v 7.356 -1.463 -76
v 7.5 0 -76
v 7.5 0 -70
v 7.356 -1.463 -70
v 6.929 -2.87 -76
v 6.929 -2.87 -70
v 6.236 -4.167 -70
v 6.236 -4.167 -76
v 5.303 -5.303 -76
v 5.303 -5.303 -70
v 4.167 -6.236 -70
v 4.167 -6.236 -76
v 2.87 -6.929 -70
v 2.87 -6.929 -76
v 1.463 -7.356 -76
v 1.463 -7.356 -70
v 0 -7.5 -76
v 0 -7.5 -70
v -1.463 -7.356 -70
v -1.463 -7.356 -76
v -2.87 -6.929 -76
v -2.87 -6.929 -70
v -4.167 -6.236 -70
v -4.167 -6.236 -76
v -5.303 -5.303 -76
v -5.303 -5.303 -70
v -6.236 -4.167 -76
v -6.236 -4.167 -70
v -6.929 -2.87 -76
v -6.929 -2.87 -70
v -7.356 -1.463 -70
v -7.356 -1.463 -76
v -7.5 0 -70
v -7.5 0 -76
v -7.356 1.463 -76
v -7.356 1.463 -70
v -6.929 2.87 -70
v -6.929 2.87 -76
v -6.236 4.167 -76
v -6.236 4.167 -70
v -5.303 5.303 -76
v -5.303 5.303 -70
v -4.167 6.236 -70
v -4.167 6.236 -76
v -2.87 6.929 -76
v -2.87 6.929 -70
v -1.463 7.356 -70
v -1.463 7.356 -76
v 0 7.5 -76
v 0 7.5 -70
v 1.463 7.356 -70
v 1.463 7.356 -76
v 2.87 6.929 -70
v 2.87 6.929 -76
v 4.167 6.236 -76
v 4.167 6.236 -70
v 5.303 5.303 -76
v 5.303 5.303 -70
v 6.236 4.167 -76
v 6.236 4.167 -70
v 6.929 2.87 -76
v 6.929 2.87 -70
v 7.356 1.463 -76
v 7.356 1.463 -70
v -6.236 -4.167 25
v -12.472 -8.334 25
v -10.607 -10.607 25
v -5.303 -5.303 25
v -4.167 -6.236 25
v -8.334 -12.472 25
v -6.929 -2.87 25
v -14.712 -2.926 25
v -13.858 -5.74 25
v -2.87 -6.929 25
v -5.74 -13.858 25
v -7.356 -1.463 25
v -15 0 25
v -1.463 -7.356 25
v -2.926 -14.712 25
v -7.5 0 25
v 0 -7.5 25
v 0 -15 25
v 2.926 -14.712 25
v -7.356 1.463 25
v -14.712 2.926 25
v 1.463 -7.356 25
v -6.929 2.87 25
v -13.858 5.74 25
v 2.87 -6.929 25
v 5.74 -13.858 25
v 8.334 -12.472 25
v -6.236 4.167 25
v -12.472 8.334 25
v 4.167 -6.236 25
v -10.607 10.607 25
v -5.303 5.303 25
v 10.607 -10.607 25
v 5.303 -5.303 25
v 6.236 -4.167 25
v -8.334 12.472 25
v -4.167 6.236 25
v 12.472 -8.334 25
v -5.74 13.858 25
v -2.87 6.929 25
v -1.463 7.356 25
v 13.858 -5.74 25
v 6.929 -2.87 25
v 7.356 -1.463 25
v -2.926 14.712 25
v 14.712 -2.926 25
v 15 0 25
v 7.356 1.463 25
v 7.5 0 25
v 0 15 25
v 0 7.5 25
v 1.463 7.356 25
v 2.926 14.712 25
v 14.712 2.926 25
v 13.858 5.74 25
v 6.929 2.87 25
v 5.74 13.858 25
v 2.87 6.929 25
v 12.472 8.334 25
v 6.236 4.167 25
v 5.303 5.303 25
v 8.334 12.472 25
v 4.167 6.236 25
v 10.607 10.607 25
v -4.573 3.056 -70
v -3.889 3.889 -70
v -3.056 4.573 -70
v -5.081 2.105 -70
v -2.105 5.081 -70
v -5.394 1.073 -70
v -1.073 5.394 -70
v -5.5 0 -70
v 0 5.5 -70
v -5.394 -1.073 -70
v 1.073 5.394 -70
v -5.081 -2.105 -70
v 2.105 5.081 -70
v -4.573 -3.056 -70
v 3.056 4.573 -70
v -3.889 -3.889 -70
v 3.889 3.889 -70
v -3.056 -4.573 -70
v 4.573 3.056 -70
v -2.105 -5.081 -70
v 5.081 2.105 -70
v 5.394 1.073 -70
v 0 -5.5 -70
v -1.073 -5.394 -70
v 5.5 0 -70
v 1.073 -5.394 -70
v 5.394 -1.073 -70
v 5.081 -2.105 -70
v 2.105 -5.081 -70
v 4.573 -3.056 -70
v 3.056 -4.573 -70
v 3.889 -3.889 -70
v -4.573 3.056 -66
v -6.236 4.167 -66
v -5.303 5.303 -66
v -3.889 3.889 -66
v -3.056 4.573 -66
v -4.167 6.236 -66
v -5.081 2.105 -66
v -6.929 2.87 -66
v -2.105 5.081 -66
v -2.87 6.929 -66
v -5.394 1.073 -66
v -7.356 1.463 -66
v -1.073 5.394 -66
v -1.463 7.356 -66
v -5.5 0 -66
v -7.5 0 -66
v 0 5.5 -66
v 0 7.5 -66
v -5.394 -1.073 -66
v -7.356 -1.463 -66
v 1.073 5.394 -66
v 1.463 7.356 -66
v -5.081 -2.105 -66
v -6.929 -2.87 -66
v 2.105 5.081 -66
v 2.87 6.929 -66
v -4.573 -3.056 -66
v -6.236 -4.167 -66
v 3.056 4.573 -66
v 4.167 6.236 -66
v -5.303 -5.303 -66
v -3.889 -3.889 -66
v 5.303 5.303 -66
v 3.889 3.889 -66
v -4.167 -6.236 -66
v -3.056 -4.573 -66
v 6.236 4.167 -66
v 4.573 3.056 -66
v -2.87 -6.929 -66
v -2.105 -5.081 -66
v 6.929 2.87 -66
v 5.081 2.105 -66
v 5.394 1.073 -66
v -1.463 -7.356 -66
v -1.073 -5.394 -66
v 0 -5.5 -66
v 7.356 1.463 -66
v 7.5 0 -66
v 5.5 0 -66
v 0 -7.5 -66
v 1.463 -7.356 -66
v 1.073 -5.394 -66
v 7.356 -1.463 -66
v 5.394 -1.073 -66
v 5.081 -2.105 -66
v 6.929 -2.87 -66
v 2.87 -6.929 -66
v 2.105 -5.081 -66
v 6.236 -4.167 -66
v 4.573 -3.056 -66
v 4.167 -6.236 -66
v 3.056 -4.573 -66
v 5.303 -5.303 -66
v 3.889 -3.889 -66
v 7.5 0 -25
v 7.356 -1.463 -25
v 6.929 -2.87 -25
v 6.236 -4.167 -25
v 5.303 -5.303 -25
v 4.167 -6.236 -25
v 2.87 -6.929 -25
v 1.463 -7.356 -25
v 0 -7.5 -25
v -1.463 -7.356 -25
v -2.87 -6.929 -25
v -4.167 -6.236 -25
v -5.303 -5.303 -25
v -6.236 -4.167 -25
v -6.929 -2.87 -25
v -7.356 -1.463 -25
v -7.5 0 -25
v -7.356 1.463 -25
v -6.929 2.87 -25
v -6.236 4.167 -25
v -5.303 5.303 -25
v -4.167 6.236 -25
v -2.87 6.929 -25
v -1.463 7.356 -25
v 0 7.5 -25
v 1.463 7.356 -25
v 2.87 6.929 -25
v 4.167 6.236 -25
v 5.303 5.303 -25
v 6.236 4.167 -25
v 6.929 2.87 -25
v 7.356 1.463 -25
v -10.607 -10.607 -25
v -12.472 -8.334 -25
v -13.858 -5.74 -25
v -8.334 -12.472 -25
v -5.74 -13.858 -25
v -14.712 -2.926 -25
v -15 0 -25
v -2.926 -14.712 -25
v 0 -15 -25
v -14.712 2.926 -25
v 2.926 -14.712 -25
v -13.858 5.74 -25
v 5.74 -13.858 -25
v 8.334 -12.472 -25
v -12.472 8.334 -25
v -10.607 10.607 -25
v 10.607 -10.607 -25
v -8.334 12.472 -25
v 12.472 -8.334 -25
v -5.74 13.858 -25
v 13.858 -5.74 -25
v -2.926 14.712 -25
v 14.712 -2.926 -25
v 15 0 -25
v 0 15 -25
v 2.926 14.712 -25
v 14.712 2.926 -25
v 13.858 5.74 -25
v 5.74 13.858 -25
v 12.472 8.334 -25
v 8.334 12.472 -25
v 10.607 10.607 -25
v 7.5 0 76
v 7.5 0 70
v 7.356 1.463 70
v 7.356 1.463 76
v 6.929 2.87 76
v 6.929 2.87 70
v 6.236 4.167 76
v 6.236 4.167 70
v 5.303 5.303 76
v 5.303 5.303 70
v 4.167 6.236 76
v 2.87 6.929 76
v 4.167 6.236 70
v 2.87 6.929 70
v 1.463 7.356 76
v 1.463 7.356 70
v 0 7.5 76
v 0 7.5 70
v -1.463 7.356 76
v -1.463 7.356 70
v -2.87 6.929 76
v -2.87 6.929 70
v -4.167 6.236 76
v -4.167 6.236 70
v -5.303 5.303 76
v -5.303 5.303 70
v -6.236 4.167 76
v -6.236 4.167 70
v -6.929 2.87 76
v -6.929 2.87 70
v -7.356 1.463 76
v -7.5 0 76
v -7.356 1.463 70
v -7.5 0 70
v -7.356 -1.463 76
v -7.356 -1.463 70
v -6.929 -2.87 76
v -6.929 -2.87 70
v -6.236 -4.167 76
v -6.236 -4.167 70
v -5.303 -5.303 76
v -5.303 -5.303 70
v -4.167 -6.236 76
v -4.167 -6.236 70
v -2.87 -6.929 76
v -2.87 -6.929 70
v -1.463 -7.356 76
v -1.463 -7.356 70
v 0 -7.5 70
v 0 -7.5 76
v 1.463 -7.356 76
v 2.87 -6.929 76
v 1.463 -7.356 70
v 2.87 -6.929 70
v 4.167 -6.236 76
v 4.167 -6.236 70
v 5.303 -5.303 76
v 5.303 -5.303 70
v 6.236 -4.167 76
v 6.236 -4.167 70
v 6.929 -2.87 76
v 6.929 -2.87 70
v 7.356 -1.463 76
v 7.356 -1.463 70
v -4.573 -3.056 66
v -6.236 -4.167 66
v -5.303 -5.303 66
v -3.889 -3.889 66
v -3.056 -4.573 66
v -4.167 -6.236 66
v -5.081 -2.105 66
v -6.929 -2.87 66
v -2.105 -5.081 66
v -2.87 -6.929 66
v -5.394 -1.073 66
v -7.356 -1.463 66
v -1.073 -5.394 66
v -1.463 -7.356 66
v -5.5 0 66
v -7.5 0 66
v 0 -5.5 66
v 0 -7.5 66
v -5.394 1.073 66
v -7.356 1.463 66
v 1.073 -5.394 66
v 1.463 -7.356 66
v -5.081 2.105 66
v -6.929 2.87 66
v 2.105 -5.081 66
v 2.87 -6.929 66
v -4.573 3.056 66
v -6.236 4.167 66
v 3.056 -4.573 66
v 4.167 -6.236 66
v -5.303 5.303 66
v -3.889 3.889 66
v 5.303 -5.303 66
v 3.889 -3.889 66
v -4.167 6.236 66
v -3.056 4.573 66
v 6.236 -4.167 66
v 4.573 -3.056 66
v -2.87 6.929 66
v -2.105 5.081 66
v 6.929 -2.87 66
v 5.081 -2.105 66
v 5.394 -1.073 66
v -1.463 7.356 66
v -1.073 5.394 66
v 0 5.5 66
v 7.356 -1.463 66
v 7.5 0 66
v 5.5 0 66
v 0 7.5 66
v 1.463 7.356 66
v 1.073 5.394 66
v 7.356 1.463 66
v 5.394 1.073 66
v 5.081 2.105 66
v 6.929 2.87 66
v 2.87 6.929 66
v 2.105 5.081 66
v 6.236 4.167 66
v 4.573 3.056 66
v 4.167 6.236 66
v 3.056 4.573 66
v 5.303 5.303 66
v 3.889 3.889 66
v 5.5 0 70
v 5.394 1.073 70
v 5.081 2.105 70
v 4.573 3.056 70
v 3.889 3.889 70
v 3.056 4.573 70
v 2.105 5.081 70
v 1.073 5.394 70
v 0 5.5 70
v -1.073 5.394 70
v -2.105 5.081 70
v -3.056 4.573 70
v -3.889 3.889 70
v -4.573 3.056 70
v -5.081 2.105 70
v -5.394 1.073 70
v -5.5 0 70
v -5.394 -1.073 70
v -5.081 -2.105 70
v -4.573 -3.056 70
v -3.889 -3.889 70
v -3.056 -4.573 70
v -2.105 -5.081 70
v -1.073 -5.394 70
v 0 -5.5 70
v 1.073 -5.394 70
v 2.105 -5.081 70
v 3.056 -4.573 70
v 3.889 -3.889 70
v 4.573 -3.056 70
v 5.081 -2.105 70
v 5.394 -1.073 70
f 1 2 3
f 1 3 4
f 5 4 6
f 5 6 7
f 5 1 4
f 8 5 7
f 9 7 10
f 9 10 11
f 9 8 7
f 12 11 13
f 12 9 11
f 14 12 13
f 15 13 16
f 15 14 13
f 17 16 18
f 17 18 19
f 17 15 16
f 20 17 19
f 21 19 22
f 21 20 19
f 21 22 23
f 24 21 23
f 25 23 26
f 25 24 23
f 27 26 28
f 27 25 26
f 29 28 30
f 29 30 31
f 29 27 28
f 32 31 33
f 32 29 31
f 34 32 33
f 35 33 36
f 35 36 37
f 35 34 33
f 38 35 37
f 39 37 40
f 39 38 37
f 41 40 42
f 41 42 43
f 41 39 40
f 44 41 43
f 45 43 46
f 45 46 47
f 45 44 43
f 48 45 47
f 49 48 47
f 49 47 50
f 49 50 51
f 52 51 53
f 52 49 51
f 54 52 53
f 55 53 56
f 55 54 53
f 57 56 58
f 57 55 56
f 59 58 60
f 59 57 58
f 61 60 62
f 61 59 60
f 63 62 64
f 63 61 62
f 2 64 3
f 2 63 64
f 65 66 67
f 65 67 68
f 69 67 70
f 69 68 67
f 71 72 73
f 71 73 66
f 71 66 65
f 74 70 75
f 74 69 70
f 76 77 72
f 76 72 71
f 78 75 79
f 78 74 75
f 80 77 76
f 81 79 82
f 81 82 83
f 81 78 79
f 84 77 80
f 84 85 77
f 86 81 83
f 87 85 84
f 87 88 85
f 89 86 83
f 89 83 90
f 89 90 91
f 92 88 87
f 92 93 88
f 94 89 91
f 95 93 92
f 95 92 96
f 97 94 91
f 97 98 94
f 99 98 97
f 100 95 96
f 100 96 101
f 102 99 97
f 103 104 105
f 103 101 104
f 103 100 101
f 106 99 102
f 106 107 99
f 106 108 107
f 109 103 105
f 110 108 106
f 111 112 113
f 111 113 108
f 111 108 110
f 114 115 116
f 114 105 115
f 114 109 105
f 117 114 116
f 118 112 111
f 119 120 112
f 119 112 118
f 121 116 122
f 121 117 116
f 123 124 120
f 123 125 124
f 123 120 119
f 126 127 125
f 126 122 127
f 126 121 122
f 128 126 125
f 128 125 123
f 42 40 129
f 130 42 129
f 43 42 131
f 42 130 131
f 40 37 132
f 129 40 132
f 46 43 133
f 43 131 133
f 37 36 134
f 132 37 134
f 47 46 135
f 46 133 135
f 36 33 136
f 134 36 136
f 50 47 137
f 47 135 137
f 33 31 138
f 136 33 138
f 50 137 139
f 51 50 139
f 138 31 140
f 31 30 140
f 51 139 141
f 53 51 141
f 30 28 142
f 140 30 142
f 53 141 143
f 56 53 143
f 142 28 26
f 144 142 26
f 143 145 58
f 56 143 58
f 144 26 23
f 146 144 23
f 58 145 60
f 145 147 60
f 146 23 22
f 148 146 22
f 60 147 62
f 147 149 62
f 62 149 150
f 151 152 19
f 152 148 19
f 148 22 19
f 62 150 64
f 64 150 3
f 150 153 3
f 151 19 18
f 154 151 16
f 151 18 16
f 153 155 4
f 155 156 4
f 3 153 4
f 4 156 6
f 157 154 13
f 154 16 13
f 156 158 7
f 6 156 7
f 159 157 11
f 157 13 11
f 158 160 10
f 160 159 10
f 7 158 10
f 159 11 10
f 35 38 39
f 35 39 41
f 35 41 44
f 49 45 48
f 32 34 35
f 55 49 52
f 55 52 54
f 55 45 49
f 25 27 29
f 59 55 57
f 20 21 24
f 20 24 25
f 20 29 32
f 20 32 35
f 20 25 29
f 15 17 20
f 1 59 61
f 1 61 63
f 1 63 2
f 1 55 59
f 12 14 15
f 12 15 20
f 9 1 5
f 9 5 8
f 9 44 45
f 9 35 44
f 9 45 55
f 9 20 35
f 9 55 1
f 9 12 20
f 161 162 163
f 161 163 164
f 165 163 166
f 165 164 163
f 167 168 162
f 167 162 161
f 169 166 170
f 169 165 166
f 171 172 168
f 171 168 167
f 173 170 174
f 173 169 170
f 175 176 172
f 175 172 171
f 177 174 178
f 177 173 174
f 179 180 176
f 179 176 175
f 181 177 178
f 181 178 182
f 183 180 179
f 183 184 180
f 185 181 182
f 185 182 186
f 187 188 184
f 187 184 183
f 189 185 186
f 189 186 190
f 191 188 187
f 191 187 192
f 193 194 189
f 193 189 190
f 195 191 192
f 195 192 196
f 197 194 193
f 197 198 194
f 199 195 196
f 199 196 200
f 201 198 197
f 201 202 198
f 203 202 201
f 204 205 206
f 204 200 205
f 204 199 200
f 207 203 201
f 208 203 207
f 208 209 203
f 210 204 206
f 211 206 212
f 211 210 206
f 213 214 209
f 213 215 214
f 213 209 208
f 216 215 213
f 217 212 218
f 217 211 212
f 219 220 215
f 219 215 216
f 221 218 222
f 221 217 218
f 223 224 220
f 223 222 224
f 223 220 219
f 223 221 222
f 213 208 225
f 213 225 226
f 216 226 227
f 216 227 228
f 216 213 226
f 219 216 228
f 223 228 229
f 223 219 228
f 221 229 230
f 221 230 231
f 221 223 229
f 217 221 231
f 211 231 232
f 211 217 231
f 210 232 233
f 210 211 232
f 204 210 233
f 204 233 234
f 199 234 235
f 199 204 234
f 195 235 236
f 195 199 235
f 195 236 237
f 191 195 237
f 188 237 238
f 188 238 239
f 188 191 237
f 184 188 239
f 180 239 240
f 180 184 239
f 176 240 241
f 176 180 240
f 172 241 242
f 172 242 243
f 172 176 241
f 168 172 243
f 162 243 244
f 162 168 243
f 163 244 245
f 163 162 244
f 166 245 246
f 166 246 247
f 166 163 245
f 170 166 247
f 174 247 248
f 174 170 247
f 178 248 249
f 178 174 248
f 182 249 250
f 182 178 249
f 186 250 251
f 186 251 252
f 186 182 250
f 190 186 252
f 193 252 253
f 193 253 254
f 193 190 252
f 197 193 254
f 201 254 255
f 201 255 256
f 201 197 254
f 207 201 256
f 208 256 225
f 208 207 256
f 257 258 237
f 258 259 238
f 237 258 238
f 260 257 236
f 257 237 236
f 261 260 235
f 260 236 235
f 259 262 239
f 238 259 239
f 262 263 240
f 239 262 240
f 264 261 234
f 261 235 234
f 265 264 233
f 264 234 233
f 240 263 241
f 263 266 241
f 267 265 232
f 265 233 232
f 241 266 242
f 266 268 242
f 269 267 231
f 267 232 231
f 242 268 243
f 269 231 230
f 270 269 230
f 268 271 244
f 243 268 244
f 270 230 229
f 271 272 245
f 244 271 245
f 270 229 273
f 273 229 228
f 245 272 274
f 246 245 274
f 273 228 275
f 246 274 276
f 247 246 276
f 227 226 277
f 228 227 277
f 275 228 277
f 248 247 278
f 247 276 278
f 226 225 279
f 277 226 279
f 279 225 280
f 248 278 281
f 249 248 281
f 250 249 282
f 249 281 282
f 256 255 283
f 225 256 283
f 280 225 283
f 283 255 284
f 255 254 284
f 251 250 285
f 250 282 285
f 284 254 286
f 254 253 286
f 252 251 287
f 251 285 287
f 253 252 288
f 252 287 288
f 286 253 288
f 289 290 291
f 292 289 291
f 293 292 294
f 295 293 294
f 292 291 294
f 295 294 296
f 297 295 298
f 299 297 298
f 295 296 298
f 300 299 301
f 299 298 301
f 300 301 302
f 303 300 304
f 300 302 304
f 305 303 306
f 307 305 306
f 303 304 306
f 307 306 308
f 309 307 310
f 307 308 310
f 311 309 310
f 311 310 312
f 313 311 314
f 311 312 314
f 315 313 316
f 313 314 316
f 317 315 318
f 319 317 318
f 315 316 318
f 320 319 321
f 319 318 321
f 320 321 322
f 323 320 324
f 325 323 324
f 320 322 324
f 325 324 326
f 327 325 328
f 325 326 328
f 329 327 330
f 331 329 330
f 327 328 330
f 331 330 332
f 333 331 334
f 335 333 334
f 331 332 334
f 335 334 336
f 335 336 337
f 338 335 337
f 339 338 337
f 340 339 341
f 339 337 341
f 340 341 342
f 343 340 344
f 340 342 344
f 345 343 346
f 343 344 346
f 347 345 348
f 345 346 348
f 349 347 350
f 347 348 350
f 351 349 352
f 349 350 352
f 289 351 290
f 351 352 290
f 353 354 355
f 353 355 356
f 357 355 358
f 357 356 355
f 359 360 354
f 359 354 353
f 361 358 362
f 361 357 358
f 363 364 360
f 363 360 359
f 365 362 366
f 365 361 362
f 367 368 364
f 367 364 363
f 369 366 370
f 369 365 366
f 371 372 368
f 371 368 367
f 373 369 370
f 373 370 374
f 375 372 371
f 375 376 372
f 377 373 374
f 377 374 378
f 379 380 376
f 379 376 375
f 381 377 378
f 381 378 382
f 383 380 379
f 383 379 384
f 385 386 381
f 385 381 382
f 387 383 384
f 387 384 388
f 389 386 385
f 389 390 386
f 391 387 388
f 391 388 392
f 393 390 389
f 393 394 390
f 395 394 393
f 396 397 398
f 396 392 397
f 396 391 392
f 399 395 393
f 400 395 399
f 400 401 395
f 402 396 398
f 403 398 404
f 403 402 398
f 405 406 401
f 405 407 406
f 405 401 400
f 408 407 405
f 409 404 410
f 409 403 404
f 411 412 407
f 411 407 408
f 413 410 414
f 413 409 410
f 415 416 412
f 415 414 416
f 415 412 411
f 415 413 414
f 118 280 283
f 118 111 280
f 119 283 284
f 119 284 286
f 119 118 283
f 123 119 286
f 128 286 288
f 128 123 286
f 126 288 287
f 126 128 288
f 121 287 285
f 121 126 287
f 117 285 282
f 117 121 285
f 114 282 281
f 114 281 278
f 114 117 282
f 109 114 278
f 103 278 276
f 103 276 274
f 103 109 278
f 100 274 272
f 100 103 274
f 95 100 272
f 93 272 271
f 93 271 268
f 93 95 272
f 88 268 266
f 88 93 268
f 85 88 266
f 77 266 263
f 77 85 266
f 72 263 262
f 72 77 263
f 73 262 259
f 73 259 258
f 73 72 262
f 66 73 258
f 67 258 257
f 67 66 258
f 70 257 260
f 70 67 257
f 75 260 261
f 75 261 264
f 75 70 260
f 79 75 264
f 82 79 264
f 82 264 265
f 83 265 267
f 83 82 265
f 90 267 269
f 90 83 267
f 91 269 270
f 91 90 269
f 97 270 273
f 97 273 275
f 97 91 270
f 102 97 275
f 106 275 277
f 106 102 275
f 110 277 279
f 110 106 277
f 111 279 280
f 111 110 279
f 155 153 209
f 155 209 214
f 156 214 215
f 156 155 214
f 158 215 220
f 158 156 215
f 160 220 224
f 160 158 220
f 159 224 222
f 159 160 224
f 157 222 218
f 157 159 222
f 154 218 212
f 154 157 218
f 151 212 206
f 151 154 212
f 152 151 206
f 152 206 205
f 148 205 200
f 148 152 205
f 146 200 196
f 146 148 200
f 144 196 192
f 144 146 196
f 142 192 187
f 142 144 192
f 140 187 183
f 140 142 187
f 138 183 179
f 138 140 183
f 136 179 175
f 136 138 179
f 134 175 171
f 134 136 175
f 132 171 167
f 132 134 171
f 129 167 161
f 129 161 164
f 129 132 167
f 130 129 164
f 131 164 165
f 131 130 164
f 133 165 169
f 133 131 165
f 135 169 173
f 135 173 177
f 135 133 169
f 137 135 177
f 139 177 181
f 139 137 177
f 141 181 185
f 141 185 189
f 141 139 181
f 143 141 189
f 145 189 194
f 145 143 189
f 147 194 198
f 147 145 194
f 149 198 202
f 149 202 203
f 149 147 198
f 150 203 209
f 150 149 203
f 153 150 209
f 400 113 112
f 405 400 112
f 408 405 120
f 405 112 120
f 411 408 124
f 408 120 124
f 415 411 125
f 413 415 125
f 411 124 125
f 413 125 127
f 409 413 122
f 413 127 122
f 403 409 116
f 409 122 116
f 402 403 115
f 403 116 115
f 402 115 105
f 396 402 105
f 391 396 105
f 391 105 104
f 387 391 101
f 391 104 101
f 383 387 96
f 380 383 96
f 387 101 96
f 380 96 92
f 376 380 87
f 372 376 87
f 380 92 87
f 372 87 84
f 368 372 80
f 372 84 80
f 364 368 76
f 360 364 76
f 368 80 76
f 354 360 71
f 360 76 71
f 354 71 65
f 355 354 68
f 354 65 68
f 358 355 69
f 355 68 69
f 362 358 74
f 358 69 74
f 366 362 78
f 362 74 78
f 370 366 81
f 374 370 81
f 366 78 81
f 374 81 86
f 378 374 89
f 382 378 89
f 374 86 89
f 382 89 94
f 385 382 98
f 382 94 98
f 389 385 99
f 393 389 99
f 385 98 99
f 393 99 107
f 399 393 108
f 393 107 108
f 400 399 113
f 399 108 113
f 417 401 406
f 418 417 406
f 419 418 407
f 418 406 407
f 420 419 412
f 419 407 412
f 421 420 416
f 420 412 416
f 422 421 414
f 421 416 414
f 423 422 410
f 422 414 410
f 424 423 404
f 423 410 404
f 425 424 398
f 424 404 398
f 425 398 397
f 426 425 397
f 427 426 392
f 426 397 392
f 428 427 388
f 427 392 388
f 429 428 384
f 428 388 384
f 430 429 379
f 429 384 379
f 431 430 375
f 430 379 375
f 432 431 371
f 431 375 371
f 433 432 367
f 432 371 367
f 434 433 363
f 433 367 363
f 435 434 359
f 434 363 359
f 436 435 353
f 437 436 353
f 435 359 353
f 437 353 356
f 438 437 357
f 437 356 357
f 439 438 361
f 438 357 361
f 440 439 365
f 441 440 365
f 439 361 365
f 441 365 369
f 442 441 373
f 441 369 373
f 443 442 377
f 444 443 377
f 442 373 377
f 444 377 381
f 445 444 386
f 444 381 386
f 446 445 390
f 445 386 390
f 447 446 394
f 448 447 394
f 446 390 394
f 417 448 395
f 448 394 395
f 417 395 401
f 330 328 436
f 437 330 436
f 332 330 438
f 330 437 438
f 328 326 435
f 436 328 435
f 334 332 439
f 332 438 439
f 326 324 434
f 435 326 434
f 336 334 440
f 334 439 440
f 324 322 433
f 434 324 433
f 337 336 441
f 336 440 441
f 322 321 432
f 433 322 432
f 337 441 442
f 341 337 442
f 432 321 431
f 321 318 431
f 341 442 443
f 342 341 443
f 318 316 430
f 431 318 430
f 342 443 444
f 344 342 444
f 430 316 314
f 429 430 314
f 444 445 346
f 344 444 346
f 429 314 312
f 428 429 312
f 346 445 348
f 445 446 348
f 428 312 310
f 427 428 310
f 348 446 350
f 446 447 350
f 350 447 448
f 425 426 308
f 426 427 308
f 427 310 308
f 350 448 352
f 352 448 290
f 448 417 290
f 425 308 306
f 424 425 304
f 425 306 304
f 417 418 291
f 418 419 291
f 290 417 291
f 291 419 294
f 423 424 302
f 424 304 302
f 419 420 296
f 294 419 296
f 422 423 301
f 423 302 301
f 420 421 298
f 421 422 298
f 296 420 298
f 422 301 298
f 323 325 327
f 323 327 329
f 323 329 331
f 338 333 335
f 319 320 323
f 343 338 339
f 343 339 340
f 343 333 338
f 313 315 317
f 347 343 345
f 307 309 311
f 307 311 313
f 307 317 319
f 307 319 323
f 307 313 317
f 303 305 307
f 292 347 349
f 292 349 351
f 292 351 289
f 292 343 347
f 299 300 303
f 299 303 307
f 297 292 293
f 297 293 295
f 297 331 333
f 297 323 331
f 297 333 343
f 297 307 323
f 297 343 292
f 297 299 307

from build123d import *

# Parameters (mm, degrees)
IZIM1_R                     = 15
Y_KSEKLIK_EKSTR_ZYON1_DEPTH = 25
IZIM2_R                     = 7.5
Y_KSEKLIK_EKSTR_ZYON2_DEPTH = 41
IZIM3_R                     = 5.5
Y_KSEKLIK_EKSTR_ZYON3_DEPTH = 4
IZIM4_R                     = 7.5
Y_KSEKLIK_EKSTR_ZYON4_DEPTH = 6
Y_KSEKLIK_EKSTR_ZYON5_START = 41
IZIM6_R                     = 7.5
Y_KSEKLIK_EKSTR_ZYON5_DEPTH = 41
Y_KSEKLIK_EKSTR_ZYON6_START = 4
IZIM7_R                     = 5.5
Y_KSEKLIK_EKSTR_ZYON6_DEPTH = 4
Y_KSEKLIK_EKSTR_ZYON7_START = 6
IZIM8_R                     = 7.5
Y_KSEKLIK_EKSTR_ZYON7_DEPTH = 6


with BuildPart() as part:
    # Çizim1 → Yükseklik-Ekstrüzyon1 (new, symmetric)
    with BuildSketch(Plane.XY):
        Circle(IZIM1_R)
    extrude(amount=Y_KSEKLIK_EKSTR_ZYON1_DEPTH, both=True)

    # Çizim2 → Yükseklik-Ekstrüzyon2 (add)
    with BuildSketch(Plane.XY.offset(25)):
        Circle(IZIM2_R)
    extrude(amount=Y_KSEKLIK_EKSTR_ZYON2_DEPTH)

    # Çizim3 → Yükseklik-Ekstrüzyon3 (add)
    with BuildSketch(Plane.XY.offset(66)):
        Circle(IZIM3_R)
    extrude(amount=Y_KSEKLIK_EKSTR_ZYON3_DEPTH)

    # Çizim4 → Yükseklik-Ekstrüzyon4 (add)
    with BuildSketch(Plane.XY.offset(70)):
        Circle(IZIM4_R)
    extrude(amount=Y_KSEKLIK_EKSTR_ZYON4_DEPTH)

    # Çizim6 → Yükseklik-Ekstrüzyon5 (add)
    with BuildSketch(Plane(origin=(0, 0, -25), x_dir=(-1, 0, 0), z_dir=(0, 0, -1)).offset(Y_KSEKLIK_EKSTR_ZYON5_START)):
        with Locations(Location((0, 0, 0), (0, 0, 180))):
            Circle(IZIM6_R)
    extrude(amount=-Y_KSEKLIK_EKSTR_ZYON5_DEPTH)

    # Çizim7 → Yükseklik-Ekstrüzyon6 (add)
    with BuildSketch(Plane(origin=(0, 0, -66), x_dir=(-1, 0, 0), z_dir=(0, 0, -1)).offset(Y_KSEKLIK_EKSTR_ZYON6_START)):
        with Locations(Location((0, 0, 0), (0, 0, 180))):
            Circle(IZIM7_R)
    extrude(amount=-Y_KSEKLIK_EKSTR_ZYON6_DEPTH)

    # Çizim8 → Yükseklik-Ekstrüzyon7 (add)
    with BuildSketch(Plane(origin=(0, 0, -70), x_dir=(-1, 0, 0), z_dir=(0, 0, -1)).offset(Y_KSEKLIK_EKSTR_ZYON7_START)):
        with Locations(Location((0, 0, 0), (0, 0, 180))):
            Circle(IZIM8_R)
    extrude(amount=-Y_KSEKLIK_EKSTR_ZYON7_DEPTH)


solid = part.part
